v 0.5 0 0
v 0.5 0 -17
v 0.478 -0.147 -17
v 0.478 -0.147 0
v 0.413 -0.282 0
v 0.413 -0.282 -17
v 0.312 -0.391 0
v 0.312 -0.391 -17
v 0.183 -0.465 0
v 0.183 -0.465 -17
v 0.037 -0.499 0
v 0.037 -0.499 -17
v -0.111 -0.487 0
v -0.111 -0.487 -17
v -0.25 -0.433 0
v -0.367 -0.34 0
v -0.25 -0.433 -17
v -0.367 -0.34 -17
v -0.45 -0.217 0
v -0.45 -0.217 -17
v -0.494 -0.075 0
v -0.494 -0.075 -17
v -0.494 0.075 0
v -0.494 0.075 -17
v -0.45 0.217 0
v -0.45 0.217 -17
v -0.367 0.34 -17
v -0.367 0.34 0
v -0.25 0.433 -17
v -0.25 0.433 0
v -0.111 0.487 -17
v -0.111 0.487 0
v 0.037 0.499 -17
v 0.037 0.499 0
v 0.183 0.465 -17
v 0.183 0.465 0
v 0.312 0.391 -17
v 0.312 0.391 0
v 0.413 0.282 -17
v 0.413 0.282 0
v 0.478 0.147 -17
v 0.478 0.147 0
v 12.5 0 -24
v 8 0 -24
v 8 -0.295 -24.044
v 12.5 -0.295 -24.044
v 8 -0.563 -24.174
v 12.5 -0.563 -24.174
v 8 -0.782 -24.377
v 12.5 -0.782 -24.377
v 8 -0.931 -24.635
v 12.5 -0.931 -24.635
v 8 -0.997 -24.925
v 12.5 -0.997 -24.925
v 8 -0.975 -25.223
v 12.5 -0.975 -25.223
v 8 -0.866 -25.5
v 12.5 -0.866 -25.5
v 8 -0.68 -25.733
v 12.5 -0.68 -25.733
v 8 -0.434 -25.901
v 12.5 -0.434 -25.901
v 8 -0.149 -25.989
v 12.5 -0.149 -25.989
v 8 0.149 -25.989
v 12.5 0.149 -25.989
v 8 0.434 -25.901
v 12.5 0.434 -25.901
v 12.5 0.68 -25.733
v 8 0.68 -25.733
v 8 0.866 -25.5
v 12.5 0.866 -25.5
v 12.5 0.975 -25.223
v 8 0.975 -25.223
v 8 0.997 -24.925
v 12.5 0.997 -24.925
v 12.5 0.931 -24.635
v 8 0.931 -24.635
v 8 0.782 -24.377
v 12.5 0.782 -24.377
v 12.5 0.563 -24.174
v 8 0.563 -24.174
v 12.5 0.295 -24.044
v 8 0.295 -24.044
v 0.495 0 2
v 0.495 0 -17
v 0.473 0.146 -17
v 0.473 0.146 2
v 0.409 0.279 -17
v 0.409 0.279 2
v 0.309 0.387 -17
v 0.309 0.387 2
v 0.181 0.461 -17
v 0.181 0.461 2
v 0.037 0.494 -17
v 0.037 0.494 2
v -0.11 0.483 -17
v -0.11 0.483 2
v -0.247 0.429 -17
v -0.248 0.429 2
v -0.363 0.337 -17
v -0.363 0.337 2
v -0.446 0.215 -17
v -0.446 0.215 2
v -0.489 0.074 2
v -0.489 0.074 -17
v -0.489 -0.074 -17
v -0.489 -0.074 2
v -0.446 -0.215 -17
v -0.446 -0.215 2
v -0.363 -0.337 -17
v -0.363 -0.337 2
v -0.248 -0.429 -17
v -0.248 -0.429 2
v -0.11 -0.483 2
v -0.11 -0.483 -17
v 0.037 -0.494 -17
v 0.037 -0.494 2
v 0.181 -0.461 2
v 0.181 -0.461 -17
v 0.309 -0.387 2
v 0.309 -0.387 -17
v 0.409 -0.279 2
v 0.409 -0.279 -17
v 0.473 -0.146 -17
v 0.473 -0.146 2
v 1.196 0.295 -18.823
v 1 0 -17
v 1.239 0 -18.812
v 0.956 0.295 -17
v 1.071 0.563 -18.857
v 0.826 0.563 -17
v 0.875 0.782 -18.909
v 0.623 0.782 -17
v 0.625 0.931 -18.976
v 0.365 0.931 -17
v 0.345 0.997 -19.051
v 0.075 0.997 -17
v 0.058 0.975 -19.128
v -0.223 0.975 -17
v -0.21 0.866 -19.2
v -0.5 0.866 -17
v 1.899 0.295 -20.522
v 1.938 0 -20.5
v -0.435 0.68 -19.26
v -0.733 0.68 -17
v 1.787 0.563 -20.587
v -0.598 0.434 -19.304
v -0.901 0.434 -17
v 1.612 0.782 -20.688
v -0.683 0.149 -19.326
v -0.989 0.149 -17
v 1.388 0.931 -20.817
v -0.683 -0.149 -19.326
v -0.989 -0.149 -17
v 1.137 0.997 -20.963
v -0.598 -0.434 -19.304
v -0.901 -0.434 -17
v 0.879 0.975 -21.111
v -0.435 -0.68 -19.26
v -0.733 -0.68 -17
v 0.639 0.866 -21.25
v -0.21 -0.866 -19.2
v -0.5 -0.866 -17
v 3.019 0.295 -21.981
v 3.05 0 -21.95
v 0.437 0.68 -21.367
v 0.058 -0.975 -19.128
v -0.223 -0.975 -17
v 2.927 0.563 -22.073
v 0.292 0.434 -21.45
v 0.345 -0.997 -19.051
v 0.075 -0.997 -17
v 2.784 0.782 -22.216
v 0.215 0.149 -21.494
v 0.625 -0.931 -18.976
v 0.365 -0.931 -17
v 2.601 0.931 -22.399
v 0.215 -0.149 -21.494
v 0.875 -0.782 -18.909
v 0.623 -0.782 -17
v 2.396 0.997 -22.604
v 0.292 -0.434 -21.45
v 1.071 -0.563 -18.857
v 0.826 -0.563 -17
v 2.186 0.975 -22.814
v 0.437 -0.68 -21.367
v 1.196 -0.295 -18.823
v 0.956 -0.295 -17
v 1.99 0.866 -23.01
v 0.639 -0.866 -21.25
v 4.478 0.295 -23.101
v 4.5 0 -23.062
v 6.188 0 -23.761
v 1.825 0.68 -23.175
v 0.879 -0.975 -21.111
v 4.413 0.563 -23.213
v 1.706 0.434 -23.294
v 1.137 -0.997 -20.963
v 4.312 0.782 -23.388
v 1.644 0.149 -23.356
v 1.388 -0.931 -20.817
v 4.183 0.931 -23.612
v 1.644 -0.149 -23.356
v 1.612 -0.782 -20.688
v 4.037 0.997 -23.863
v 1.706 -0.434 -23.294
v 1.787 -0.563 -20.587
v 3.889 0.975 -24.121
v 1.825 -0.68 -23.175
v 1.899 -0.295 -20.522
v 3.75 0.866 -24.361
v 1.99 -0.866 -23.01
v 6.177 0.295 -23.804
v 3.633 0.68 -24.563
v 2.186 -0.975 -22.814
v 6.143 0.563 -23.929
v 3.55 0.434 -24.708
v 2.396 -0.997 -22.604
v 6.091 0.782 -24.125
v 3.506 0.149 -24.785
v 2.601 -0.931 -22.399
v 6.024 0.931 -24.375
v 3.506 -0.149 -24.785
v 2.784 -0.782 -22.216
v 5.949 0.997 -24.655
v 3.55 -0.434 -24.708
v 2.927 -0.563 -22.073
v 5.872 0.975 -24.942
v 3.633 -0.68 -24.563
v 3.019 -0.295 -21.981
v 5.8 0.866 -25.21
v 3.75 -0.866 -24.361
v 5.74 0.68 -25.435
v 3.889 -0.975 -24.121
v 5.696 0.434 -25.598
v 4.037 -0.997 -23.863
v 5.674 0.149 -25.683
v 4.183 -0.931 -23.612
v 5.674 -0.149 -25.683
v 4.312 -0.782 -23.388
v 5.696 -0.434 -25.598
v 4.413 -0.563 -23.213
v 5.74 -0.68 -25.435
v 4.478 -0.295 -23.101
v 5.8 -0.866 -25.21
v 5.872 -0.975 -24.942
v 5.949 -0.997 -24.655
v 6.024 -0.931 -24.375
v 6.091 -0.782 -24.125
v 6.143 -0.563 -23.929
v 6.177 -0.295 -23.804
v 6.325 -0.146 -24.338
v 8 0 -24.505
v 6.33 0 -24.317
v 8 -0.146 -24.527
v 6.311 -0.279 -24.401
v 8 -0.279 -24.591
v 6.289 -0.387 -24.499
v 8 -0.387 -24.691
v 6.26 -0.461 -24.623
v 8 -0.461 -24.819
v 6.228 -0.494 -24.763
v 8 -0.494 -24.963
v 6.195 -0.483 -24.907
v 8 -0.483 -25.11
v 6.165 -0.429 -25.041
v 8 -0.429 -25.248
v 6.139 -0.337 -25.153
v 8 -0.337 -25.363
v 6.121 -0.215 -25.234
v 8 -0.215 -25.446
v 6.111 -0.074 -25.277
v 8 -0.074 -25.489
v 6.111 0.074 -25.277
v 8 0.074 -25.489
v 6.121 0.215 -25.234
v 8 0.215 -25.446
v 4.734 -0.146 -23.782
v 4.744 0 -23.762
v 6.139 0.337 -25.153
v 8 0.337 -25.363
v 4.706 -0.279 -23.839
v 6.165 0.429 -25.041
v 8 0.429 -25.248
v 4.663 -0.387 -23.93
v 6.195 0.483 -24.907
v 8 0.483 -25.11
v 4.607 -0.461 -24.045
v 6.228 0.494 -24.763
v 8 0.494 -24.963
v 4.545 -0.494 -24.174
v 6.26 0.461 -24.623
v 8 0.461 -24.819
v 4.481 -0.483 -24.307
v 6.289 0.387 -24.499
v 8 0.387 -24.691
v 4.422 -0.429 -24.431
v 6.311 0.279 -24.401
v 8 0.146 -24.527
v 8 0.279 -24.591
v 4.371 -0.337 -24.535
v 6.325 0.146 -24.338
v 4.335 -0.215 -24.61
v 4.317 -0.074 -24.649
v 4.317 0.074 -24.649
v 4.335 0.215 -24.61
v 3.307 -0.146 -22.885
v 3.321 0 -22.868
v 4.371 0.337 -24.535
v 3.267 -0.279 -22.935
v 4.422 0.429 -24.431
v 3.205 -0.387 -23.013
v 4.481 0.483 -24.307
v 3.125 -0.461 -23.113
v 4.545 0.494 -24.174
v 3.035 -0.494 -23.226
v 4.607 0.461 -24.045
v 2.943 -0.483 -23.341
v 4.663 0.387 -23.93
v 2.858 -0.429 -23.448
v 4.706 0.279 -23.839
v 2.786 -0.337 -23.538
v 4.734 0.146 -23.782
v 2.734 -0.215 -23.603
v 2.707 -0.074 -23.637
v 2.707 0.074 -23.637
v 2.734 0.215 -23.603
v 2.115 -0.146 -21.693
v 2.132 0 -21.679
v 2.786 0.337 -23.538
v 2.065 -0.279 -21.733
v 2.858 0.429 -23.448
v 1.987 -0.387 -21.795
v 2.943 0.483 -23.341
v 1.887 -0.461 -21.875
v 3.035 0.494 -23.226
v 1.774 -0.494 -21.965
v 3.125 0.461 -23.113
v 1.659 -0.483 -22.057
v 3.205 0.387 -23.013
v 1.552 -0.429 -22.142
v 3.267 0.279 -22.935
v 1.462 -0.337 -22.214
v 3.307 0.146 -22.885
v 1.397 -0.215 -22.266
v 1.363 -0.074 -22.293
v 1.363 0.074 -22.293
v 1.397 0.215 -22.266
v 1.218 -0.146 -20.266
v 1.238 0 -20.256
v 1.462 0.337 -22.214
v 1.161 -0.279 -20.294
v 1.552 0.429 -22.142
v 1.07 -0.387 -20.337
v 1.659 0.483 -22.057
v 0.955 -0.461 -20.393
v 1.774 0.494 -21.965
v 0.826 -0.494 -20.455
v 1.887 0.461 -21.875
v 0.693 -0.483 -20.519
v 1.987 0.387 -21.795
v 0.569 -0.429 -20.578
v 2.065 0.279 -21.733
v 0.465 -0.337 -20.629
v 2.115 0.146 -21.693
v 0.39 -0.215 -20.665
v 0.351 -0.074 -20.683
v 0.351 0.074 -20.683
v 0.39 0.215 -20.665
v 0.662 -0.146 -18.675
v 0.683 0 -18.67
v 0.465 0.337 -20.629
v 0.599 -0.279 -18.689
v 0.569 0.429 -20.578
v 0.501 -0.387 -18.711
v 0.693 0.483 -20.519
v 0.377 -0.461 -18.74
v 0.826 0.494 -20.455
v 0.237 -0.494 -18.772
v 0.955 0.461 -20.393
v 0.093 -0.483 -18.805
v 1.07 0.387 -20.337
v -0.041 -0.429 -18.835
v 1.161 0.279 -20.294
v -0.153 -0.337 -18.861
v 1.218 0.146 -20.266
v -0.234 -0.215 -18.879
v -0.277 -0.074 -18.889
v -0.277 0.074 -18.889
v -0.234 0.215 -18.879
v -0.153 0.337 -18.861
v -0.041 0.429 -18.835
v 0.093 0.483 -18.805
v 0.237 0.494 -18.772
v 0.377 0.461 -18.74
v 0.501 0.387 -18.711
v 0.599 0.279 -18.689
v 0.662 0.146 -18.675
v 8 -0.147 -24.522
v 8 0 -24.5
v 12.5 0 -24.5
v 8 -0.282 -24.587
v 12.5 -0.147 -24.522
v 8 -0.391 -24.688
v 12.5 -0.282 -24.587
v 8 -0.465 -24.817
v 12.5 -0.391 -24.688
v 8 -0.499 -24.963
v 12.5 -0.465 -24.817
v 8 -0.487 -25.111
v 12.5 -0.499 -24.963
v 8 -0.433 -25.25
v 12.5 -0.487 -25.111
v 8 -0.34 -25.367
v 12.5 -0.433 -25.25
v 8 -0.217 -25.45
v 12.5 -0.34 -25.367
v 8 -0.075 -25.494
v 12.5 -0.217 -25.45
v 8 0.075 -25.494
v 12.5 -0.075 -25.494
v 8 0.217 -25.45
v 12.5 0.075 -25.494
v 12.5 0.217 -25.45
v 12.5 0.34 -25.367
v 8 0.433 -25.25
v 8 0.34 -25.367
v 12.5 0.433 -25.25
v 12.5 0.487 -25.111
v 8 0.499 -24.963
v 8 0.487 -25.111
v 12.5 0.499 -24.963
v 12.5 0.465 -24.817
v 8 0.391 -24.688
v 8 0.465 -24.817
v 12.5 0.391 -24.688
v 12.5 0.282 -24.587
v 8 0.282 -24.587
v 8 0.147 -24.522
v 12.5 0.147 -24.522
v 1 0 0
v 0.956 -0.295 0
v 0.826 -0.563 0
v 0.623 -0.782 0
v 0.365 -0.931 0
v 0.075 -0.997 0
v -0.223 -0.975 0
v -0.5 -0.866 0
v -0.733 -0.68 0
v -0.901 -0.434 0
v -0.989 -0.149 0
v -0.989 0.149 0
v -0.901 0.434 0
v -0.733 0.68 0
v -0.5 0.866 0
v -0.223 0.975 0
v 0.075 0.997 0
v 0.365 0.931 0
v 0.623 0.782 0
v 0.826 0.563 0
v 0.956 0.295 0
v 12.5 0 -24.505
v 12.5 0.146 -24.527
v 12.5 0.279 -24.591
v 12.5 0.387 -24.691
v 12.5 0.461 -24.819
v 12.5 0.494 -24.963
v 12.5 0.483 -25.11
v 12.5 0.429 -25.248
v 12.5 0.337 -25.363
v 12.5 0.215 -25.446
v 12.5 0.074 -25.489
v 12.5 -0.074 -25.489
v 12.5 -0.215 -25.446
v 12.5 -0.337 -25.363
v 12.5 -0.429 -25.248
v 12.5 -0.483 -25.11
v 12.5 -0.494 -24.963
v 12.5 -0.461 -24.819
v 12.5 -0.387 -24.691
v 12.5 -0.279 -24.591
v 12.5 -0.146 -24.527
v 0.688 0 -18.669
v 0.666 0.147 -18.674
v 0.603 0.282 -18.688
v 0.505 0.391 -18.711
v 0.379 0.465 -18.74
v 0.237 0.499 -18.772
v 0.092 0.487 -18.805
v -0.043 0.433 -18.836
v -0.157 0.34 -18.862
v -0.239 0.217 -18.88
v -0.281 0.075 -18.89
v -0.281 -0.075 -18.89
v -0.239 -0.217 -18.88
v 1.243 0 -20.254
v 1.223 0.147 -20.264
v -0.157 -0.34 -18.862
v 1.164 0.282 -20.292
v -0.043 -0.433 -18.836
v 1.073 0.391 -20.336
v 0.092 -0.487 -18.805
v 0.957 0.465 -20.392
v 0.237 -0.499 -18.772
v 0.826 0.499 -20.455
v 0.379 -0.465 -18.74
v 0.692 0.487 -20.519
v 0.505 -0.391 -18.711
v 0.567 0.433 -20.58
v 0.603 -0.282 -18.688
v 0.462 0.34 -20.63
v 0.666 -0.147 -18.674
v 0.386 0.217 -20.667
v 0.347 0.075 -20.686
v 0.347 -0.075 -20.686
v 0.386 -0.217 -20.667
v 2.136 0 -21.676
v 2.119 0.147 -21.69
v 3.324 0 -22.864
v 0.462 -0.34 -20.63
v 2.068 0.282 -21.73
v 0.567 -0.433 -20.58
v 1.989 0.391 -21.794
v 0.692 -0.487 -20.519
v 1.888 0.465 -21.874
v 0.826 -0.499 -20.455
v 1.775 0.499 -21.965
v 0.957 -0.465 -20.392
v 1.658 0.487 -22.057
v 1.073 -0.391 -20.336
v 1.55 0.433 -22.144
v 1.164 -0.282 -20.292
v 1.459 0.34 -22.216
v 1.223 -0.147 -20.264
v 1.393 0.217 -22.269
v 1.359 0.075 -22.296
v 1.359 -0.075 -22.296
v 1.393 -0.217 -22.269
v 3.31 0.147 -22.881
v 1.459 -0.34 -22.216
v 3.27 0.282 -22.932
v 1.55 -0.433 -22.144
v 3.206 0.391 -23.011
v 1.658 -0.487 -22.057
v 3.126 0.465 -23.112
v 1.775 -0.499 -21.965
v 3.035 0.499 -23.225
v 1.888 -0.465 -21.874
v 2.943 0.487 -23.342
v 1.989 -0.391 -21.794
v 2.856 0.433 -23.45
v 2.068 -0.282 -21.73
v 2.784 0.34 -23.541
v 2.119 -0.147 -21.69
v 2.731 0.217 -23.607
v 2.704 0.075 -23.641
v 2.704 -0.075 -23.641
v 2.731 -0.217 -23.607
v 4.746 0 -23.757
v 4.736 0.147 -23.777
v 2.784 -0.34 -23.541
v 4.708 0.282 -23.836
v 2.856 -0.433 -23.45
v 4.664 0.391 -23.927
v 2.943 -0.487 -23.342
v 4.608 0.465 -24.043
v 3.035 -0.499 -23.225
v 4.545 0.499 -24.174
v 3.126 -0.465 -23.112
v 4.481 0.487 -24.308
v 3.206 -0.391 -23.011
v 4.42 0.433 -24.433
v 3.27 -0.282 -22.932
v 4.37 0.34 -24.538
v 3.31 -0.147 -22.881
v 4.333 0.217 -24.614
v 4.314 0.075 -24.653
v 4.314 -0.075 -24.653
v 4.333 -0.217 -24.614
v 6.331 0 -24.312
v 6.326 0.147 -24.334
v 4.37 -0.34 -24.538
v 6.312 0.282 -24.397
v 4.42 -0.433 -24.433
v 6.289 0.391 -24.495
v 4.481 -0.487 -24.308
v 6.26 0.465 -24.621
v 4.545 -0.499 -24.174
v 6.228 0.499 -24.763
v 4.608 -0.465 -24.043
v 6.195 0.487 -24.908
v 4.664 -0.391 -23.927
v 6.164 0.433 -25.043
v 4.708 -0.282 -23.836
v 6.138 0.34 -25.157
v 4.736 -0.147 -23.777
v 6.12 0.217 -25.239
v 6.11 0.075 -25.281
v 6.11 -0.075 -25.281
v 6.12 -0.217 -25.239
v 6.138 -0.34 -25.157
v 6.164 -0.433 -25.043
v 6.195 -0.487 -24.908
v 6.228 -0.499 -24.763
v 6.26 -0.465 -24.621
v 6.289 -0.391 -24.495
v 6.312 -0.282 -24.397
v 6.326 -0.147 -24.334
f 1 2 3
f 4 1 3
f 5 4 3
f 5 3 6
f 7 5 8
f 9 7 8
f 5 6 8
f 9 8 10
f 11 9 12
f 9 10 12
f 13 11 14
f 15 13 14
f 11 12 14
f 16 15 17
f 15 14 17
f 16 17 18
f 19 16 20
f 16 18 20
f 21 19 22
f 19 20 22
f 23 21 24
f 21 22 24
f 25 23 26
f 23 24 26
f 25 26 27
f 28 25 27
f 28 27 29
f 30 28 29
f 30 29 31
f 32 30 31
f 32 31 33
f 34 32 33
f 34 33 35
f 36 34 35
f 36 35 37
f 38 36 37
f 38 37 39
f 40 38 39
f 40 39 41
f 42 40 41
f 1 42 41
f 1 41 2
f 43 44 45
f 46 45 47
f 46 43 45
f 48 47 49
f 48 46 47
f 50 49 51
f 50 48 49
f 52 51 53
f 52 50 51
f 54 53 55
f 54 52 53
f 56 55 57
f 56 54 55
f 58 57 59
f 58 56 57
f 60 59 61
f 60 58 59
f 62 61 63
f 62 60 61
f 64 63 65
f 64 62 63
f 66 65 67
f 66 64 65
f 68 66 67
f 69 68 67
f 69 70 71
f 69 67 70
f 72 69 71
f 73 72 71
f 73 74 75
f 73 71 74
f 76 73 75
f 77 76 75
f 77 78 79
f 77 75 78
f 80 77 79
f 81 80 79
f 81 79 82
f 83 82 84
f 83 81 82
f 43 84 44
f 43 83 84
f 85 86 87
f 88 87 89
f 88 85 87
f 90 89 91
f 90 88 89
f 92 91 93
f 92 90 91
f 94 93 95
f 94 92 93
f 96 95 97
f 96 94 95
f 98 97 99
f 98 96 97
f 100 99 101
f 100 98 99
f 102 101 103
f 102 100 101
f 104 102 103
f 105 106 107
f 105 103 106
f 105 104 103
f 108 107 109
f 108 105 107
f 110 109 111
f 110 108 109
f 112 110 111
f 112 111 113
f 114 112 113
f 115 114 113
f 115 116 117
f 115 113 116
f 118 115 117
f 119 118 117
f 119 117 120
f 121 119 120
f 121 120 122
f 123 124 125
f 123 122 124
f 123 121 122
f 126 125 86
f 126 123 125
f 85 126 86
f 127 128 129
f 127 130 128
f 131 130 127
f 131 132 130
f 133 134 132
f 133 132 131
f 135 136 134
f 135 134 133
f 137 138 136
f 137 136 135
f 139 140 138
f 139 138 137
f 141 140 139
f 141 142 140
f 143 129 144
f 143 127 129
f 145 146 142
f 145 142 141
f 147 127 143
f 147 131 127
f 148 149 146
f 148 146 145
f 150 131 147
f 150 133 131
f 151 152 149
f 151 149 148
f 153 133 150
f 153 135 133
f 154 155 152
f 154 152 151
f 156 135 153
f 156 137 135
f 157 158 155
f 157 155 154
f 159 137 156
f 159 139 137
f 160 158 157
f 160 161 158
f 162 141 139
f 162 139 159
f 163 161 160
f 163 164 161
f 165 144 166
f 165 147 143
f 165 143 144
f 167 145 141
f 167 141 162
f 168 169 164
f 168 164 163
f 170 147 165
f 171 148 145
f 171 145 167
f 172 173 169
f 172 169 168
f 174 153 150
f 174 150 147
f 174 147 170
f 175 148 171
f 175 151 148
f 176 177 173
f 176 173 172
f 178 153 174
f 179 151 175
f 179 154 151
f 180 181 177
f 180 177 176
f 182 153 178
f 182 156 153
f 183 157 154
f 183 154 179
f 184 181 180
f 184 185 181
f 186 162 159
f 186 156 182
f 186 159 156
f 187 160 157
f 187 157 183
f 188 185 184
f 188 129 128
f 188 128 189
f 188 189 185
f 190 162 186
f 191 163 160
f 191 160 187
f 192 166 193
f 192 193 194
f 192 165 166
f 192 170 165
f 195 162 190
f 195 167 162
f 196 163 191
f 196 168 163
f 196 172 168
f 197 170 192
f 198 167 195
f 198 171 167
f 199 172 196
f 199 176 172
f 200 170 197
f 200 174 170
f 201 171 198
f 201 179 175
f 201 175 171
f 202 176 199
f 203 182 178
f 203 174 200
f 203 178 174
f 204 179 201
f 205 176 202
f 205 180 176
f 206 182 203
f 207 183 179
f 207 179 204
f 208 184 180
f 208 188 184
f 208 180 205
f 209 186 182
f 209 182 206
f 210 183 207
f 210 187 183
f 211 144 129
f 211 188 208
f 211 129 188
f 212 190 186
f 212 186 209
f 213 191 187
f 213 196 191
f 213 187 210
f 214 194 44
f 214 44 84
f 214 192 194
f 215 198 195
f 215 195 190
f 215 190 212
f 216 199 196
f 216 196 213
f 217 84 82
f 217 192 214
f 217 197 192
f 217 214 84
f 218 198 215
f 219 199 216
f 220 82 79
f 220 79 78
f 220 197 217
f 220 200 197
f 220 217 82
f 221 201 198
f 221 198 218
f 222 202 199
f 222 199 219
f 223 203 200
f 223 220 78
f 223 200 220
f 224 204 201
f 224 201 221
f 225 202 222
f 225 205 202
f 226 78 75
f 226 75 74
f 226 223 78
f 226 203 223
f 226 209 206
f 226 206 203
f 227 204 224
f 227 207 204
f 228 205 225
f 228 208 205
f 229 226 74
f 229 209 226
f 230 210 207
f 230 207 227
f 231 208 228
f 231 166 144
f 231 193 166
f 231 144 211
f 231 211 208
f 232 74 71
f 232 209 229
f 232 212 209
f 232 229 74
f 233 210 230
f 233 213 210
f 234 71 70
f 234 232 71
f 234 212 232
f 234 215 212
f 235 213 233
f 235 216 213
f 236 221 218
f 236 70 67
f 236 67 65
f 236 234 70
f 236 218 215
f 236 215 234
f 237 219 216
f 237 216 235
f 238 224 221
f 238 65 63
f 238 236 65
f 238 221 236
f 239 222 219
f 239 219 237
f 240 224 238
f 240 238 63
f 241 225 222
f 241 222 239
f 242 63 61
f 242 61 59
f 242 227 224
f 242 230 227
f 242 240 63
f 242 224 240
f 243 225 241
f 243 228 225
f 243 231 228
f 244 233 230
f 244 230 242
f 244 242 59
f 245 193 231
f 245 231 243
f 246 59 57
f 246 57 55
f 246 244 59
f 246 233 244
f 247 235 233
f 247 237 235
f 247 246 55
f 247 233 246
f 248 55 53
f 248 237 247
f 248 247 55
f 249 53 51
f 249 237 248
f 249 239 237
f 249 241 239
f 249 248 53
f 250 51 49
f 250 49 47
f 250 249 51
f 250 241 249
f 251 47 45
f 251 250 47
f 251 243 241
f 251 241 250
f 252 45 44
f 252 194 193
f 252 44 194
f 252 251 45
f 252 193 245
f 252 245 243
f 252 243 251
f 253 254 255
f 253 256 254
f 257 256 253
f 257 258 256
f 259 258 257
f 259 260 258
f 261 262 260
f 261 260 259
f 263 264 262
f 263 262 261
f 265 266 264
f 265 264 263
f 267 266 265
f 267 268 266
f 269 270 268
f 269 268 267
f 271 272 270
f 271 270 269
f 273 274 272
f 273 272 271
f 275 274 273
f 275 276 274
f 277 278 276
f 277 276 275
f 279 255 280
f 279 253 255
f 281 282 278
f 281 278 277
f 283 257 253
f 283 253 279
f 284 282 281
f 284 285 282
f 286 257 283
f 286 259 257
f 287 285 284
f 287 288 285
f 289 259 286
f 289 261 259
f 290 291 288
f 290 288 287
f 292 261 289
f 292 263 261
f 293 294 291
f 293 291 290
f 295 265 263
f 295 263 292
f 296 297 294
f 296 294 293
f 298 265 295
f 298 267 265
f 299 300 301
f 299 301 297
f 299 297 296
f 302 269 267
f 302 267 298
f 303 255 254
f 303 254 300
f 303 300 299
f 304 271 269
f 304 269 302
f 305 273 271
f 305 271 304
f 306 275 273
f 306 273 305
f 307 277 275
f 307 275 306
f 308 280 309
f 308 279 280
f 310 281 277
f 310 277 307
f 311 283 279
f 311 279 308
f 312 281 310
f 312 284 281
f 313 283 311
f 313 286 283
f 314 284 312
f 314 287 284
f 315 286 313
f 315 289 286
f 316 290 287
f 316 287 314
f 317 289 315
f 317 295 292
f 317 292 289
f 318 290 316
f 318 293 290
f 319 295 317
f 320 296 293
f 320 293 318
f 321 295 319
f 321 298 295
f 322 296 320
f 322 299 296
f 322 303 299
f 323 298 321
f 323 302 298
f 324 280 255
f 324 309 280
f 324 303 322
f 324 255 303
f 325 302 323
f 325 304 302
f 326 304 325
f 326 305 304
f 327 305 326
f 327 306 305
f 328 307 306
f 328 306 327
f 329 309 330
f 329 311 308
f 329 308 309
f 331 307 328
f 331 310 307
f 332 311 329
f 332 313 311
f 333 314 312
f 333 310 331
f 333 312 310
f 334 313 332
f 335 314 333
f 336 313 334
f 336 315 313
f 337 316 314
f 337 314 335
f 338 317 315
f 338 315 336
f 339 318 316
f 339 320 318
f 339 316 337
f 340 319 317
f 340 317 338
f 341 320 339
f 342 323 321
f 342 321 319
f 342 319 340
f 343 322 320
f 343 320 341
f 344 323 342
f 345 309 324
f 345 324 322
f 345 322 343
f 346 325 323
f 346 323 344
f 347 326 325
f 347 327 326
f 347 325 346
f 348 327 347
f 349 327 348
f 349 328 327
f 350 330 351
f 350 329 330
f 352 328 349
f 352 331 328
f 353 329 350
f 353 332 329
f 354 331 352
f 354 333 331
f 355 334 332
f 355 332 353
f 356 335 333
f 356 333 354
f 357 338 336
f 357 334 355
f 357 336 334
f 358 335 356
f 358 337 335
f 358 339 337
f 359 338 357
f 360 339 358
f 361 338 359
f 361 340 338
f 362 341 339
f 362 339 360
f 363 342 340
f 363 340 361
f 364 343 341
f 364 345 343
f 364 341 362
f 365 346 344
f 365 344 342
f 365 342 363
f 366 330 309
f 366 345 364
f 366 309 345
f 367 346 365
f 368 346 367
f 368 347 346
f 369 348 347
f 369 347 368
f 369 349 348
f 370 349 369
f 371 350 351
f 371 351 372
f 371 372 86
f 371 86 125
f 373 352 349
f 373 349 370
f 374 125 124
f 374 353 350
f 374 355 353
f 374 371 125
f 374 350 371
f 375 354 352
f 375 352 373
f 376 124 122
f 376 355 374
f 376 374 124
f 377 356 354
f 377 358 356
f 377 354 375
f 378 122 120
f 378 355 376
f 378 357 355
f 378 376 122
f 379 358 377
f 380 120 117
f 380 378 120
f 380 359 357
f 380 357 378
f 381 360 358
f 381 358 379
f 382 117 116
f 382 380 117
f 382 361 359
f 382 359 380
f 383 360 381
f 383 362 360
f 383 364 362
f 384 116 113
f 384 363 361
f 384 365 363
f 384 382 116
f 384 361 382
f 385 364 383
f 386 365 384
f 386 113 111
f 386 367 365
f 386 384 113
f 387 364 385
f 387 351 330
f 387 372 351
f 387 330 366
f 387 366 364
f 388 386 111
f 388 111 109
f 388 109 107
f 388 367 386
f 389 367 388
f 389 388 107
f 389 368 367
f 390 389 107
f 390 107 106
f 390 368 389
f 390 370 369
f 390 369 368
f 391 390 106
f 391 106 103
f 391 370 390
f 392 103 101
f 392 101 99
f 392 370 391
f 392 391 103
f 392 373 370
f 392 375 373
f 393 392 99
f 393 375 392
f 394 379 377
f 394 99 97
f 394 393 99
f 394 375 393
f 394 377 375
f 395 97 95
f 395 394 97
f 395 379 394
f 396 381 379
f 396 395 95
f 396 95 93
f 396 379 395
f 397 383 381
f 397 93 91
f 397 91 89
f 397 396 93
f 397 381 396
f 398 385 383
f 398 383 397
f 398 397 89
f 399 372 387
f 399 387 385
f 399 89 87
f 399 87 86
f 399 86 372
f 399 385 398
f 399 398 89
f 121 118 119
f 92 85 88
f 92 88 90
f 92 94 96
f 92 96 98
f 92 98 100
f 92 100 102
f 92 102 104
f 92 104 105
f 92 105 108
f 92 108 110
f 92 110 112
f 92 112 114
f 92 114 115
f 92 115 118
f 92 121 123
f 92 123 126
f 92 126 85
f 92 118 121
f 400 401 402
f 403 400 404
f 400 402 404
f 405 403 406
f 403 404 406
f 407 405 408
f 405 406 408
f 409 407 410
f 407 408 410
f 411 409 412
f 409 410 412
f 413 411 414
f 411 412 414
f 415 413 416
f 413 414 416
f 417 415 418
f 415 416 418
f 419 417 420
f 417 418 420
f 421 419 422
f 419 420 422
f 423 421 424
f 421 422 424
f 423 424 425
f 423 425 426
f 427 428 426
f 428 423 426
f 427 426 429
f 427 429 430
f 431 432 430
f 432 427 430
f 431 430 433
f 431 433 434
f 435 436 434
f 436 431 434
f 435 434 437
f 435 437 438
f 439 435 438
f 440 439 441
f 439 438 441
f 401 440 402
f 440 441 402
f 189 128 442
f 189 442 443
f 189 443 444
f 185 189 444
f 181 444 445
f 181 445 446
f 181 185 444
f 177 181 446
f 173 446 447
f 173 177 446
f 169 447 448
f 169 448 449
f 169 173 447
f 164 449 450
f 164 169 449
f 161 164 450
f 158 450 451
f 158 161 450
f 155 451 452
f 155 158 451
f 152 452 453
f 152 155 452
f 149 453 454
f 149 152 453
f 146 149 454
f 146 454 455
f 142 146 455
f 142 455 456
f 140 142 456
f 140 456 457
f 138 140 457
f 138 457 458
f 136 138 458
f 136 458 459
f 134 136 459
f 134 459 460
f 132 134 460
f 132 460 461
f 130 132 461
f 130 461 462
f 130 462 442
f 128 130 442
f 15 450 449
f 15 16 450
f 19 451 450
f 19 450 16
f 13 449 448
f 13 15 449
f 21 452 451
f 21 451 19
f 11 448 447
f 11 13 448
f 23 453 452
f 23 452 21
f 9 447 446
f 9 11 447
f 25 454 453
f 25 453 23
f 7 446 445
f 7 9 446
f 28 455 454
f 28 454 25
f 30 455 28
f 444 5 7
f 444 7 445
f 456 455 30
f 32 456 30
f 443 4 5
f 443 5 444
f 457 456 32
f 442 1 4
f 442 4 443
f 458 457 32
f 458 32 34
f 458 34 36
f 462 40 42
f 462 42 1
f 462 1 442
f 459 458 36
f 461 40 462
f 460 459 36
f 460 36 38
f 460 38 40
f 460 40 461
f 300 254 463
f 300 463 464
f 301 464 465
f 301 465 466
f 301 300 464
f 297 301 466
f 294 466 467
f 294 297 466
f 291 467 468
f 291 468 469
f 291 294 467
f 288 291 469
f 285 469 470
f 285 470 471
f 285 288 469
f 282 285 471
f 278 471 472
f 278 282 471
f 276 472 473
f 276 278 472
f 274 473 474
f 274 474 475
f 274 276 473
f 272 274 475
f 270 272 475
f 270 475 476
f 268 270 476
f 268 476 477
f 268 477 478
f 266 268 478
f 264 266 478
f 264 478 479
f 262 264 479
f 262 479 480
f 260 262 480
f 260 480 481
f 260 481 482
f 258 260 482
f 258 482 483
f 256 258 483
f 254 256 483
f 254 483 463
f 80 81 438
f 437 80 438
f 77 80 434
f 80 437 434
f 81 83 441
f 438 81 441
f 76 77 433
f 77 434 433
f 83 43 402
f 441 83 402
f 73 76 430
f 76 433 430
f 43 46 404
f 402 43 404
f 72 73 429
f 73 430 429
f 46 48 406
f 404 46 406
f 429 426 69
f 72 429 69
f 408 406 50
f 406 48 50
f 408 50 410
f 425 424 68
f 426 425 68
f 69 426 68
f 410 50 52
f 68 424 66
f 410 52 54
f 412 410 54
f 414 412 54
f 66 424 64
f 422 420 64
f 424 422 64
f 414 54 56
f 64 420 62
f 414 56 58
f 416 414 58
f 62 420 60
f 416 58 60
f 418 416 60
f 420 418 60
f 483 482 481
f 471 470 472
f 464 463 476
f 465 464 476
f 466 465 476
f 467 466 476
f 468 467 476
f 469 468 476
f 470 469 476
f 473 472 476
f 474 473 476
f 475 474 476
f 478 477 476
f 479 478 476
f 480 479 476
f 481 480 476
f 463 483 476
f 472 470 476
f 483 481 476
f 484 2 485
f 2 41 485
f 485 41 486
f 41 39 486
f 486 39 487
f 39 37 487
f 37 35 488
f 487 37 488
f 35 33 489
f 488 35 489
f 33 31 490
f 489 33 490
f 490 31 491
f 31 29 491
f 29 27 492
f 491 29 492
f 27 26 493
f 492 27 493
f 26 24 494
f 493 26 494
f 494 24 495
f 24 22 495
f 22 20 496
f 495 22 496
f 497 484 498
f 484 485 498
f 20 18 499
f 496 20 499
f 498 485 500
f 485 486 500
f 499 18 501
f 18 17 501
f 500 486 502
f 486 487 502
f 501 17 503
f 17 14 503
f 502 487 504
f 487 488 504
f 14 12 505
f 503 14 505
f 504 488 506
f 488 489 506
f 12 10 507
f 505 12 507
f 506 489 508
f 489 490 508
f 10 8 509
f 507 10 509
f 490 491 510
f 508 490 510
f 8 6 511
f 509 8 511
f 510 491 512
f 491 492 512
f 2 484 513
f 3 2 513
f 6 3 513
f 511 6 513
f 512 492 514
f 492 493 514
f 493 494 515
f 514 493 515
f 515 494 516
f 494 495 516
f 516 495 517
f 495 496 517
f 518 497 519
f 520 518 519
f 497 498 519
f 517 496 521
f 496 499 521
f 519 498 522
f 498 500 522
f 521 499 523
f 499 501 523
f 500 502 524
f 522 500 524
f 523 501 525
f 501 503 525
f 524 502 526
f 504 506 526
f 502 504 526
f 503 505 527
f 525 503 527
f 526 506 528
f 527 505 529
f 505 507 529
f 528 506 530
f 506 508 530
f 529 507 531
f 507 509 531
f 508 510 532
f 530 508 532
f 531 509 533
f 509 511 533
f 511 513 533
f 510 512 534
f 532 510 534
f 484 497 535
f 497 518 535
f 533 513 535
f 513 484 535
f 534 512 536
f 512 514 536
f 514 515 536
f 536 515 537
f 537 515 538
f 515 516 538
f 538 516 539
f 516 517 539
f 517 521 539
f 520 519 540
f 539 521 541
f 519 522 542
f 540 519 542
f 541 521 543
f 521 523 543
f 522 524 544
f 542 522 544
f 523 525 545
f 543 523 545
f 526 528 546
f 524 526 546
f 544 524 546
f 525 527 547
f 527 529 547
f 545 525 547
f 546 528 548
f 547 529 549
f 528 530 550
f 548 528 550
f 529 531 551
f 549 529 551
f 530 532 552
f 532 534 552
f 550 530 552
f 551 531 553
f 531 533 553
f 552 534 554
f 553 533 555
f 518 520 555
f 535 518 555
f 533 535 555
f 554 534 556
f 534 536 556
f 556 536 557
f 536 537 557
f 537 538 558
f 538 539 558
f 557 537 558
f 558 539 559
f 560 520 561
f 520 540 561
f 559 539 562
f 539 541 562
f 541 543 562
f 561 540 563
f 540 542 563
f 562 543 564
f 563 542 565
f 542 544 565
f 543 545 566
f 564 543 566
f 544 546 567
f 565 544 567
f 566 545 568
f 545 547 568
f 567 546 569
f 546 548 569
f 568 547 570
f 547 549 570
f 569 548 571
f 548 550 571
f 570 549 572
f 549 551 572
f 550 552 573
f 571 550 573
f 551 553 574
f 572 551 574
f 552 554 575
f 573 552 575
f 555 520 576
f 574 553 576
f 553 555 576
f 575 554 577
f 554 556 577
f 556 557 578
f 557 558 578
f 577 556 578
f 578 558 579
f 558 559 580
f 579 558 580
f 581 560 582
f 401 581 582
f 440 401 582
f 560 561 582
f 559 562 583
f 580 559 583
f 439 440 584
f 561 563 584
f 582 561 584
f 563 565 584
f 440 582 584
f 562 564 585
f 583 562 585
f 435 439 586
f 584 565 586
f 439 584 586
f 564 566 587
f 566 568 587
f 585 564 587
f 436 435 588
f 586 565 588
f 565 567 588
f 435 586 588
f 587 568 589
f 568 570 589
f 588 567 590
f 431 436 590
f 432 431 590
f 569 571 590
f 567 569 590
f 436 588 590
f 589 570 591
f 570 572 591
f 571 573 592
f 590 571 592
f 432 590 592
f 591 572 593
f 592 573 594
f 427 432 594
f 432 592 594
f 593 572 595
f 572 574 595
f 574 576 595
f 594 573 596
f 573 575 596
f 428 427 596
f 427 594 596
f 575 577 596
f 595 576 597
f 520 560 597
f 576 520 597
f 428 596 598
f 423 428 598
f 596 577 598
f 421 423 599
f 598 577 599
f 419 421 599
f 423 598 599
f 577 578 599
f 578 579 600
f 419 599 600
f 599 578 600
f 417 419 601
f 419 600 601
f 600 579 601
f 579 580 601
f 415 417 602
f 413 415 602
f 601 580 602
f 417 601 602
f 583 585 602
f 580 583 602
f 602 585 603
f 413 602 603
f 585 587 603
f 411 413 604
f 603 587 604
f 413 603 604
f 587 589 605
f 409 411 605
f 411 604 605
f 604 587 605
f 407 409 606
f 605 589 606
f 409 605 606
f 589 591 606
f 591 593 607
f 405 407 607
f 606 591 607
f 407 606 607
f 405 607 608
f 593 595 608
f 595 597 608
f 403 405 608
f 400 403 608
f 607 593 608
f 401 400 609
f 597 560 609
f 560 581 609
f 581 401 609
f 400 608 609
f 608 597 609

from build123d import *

# Parameters (mm, degrees)
SKETCH_2_R   = 1
SKETCH_2_R_2 = 0.5
SKETCH_4_R   = 0.495


with BuildPart() as part:
    # 扫描1: sweep along a path in 草图1
    with BuildLine(Plane(origin=(0, 0, 0), x_dir=(1, 0, 0), z_dir=(0, 1, 0))) as sweep_1_path:
        Line((0, 0), (0, 17))
        ThreePointArc((0, 17), (2.343145751, 22.656854249), (8, 25))
        Line((8, 25), (12.5, 25))
    # 草图2 → 扫描1 (sweep)
    with BuildSketch(Plane.XY):
        Circle(SKETCH_2_R)
        Circle(SKETCH_2_R_2, mode=Mode.SUBTRACT)
    sweep(path=sweep_1_path.line)


with BuildPart() as body_2:
    # 扫描2: sweep along a path in 草图3
    with BuildLine(Plane(origin=(0, 0, 0), x_dir=(1, 0, 0), z_dir=(0, 1, 0))) as sweep_2_path:
        Line((12.5, 25), (8, 25))
        ThreePointArc((8, 25), (2.343145751, 22.656854249), (0, 17))
        Line((0, 17), (0, 0))
        Line((0, 0), (0, -2))
    # 草图4 → 扫描2 (sweep)
    with BuildSketch(Plane.XY):
        Circle(SKETCH_4_R)
    sweep(path=sweep_2_path.line)


solid = Compound([part.part, body_2.part])
